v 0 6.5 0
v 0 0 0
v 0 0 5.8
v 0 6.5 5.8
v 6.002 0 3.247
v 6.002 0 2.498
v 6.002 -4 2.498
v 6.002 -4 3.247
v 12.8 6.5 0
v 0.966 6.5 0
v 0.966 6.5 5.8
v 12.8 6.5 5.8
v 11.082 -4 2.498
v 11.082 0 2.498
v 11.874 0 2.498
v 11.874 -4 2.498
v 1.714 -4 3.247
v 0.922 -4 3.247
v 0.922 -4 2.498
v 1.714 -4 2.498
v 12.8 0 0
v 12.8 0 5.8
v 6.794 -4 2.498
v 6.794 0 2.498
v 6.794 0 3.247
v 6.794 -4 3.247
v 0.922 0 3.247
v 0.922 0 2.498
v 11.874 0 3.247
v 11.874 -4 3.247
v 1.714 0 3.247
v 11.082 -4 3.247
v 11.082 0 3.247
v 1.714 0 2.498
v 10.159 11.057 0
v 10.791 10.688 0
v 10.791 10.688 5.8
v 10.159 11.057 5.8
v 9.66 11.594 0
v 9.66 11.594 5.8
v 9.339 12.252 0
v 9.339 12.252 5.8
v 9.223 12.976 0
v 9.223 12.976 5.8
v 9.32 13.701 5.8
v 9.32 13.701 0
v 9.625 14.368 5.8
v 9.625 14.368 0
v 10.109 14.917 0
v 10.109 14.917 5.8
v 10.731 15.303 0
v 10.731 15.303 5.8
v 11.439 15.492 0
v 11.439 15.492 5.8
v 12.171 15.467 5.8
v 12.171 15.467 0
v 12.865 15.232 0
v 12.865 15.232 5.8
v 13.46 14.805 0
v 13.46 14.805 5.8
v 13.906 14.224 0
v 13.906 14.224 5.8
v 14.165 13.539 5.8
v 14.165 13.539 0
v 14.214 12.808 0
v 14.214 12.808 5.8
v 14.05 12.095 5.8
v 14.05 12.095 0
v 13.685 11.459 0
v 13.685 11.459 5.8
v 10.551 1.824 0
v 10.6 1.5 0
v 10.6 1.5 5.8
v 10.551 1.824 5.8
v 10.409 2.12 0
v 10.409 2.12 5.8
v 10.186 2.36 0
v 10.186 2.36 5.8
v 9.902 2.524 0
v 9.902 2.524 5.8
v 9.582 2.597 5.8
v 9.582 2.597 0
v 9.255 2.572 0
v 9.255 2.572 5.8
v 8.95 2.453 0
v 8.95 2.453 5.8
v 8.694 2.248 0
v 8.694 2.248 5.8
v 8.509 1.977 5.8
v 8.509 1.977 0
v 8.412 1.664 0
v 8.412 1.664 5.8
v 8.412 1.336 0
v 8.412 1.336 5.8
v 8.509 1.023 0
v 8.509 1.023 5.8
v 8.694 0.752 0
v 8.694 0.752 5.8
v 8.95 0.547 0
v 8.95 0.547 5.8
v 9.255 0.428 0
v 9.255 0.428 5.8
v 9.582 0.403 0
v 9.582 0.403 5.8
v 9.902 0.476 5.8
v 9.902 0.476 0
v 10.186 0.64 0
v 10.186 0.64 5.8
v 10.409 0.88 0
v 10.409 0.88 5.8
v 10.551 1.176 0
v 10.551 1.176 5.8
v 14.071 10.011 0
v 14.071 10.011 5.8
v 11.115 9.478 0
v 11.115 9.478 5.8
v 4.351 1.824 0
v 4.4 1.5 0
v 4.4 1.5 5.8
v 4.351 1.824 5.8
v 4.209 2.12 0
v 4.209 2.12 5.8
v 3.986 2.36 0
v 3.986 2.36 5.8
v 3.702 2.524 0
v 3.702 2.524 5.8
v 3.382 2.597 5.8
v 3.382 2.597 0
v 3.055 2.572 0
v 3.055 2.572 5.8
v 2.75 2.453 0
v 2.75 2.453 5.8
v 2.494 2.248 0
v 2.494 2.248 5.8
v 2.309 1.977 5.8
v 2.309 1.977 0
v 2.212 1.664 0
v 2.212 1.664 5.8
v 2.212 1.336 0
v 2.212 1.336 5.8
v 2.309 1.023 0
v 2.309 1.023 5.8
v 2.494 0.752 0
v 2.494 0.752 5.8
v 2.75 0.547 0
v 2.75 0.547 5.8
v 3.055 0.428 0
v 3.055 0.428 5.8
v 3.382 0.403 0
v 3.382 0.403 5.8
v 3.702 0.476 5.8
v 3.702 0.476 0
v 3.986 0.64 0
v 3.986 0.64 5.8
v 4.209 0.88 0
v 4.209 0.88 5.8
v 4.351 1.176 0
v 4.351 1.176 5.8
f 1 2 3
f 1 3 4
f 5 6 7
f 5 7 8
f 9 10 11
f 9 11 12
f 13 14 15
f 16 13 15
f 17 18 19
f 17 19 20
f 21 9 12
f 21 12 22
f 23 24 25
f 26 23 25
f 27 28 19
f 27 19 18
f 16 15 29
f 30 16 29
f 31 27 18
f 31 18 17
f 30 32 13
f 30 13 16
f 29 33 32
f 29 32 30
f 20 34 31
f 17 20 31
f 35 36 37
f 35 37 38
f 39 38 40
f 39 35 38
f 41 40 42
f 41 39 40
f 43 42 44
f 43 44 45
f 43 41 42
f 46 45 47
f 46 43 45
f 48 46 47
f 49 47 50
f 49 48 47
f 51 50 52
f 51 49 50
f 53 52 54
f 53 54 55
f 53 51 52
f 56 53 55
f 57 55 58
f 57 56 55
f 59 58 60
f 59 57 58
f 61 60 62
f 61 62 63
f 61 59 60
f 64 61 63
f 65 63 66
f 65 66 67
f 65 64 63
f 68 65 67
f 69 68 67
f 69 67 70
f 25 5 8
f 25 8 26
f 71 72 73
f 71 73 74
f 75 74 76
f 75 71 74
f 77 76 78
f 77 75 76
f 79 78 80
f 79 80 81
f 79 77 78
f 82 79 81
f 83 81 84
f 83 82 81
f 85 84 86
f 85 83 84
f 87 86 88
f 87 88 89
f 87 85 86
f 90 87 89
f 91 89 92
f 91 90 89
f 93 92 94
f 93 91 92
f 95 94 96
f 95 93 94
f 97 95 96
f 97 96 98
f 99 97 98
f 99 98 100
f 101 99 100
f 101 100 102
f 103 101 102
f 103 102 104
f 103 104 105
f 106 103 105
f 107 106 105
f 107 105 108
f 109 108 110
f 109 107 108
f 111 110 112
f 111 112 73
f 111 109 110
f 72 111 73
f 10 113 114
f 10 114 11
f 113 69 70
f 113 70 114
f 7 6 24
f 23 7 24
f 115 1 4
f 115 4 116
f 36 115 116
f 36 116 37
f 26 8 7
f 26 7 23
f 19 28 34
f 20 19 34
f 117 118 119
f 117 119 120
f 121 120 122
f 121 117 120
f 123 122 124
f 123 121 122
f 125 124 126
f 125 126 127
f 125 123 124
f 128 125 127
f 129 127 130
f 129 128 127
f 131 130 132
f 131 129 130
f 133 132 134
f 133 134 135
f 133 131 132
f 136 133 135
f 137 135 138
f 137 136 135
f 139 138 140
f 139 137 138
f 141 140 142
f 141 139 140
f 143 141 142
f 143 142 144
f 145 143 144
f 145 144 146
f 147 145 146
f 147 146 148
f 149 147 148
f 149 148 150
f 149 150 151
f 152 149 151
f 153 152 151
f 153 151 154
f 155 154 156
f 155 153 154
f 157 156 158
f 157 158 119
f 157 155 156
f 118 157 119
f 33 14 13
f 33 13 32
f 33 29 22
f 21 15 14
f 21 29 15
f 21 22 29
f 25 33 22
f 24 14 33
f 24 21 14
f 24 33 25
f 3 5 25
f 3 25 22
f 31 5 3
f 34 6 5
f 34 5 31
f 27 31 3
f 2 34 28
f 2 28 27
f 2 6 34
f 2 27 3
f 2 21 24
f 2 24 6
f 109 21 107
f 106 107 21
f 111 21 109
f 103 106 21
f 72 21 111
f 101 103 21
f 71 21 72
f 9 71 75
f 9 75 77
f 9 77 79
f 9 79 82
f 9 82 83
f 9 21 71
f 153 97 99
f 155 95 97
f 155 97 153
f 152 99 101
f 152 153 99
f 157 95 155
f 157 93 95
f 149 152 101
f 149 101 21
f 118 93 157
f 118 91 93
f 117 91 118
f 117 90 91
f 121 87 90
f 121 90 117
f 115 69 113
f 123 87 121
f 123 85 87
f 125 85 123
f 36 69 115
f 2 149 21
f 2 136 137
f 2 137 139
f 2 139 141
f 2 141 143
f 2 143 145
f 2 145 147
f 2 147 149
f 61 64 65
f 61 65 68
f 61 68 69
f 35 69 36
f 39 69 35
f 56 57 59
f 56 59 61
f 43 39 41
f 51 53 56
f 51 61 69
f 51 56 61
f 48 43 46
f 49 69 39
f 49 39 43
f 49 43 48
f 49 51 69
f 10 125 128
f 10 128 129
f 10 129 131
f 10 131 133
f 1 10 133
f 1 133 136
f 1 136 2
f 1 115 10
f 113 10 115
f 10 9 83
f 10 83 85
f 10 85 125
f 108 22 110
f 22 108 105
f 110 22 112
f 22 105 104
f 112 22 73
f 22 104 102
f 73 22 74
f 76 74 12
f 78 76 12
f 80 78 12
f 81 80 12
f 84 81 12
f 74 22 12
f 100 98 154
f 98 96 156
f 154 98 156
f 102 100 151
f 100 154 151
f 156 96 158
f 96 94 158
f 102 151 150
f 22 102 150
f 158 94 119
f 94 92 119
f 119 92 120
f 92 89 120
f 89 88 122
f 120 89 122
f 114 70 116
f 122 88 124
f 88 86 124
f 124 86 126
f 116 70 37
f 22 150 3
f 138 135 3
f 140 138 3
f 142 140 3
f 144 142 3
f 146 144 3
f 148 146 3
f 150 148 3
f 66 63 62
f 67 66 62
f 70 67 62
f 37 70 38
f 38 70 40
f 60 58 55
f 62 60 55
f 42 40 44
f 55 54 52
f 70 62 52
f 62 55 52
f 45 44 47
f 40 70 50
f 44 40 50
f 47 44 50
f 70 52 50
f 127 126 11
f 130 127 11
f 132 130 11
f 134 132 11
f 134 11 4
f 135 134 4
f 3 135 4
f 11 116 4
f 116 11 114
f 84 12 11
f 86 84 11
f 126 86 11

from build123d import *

# Parameters (mm, degrees)
SKETCH1_R           = 1.1
BOSS_EXTRUDE1_DEPTH = 5.8
SKETCH2_W           = 0.791647492
SKETCH2_H           = 0.74846672
BOSS_EXTRUDE2_DEPTH = 4


with BuildPart() as part:
    # Sketch1 → Boss-Extrude1 (new body)
    with BuildSketch(Plane.XY):
        with BuildLine():
            Line((0, 6.5), (11.115162843, 9.478298908))
            Line((11.115162843, 9.478298908), (10.79107709, 10.687803405))
            ThreePointArc((10.79107709, 10.687803405), (11.078349161, 15.423518447), (13.684925248, 11.459267786))
            Line((13.684925248, 11.459267786), (14.070629242, 10.011394697))
            Line((14.070629242, 10.011394697), (0.965925826, 6.5))
            Line((0.965925826, 6.5), (12.8, 6.5))
            Line((12.8, 6.5), (12.8, 0))
            Line((12.8, 0), (0, 0))
            Line((0, 0), (0, 6.5))
        make_face()
        with Locations((3.3, 1.5)):
            Circle(SKETCH1_R, mode=Mode.SUBTRACT)
        with Locations((9.5, 1.5)):
            Circle(SKETCH1_R, mode=Mode.SUBTRACT)
    extrude(amount=BOSS_EXTRUDE1_DEPTH)

    # Sketch2 → Boss-Extrude2 (add)
    with BuildSketch(Plane.XZ):
        with Locations((6.397743587, 2.872700046)):
            Rectangle(SKETCH2_W, SKETCH2_H)
        with Locations((1.317743587, 2.872700046)):
            Rectangle(SKETCH2_W, SKETCH2_H)
        with Locations((11.477743587, 2.872700046)):
            Rectangle(SKETCH2_W, SKETCH2_H)
    extrude(amount=BOSS_EXTRUDE2_DEPTH)


solid = part.part
